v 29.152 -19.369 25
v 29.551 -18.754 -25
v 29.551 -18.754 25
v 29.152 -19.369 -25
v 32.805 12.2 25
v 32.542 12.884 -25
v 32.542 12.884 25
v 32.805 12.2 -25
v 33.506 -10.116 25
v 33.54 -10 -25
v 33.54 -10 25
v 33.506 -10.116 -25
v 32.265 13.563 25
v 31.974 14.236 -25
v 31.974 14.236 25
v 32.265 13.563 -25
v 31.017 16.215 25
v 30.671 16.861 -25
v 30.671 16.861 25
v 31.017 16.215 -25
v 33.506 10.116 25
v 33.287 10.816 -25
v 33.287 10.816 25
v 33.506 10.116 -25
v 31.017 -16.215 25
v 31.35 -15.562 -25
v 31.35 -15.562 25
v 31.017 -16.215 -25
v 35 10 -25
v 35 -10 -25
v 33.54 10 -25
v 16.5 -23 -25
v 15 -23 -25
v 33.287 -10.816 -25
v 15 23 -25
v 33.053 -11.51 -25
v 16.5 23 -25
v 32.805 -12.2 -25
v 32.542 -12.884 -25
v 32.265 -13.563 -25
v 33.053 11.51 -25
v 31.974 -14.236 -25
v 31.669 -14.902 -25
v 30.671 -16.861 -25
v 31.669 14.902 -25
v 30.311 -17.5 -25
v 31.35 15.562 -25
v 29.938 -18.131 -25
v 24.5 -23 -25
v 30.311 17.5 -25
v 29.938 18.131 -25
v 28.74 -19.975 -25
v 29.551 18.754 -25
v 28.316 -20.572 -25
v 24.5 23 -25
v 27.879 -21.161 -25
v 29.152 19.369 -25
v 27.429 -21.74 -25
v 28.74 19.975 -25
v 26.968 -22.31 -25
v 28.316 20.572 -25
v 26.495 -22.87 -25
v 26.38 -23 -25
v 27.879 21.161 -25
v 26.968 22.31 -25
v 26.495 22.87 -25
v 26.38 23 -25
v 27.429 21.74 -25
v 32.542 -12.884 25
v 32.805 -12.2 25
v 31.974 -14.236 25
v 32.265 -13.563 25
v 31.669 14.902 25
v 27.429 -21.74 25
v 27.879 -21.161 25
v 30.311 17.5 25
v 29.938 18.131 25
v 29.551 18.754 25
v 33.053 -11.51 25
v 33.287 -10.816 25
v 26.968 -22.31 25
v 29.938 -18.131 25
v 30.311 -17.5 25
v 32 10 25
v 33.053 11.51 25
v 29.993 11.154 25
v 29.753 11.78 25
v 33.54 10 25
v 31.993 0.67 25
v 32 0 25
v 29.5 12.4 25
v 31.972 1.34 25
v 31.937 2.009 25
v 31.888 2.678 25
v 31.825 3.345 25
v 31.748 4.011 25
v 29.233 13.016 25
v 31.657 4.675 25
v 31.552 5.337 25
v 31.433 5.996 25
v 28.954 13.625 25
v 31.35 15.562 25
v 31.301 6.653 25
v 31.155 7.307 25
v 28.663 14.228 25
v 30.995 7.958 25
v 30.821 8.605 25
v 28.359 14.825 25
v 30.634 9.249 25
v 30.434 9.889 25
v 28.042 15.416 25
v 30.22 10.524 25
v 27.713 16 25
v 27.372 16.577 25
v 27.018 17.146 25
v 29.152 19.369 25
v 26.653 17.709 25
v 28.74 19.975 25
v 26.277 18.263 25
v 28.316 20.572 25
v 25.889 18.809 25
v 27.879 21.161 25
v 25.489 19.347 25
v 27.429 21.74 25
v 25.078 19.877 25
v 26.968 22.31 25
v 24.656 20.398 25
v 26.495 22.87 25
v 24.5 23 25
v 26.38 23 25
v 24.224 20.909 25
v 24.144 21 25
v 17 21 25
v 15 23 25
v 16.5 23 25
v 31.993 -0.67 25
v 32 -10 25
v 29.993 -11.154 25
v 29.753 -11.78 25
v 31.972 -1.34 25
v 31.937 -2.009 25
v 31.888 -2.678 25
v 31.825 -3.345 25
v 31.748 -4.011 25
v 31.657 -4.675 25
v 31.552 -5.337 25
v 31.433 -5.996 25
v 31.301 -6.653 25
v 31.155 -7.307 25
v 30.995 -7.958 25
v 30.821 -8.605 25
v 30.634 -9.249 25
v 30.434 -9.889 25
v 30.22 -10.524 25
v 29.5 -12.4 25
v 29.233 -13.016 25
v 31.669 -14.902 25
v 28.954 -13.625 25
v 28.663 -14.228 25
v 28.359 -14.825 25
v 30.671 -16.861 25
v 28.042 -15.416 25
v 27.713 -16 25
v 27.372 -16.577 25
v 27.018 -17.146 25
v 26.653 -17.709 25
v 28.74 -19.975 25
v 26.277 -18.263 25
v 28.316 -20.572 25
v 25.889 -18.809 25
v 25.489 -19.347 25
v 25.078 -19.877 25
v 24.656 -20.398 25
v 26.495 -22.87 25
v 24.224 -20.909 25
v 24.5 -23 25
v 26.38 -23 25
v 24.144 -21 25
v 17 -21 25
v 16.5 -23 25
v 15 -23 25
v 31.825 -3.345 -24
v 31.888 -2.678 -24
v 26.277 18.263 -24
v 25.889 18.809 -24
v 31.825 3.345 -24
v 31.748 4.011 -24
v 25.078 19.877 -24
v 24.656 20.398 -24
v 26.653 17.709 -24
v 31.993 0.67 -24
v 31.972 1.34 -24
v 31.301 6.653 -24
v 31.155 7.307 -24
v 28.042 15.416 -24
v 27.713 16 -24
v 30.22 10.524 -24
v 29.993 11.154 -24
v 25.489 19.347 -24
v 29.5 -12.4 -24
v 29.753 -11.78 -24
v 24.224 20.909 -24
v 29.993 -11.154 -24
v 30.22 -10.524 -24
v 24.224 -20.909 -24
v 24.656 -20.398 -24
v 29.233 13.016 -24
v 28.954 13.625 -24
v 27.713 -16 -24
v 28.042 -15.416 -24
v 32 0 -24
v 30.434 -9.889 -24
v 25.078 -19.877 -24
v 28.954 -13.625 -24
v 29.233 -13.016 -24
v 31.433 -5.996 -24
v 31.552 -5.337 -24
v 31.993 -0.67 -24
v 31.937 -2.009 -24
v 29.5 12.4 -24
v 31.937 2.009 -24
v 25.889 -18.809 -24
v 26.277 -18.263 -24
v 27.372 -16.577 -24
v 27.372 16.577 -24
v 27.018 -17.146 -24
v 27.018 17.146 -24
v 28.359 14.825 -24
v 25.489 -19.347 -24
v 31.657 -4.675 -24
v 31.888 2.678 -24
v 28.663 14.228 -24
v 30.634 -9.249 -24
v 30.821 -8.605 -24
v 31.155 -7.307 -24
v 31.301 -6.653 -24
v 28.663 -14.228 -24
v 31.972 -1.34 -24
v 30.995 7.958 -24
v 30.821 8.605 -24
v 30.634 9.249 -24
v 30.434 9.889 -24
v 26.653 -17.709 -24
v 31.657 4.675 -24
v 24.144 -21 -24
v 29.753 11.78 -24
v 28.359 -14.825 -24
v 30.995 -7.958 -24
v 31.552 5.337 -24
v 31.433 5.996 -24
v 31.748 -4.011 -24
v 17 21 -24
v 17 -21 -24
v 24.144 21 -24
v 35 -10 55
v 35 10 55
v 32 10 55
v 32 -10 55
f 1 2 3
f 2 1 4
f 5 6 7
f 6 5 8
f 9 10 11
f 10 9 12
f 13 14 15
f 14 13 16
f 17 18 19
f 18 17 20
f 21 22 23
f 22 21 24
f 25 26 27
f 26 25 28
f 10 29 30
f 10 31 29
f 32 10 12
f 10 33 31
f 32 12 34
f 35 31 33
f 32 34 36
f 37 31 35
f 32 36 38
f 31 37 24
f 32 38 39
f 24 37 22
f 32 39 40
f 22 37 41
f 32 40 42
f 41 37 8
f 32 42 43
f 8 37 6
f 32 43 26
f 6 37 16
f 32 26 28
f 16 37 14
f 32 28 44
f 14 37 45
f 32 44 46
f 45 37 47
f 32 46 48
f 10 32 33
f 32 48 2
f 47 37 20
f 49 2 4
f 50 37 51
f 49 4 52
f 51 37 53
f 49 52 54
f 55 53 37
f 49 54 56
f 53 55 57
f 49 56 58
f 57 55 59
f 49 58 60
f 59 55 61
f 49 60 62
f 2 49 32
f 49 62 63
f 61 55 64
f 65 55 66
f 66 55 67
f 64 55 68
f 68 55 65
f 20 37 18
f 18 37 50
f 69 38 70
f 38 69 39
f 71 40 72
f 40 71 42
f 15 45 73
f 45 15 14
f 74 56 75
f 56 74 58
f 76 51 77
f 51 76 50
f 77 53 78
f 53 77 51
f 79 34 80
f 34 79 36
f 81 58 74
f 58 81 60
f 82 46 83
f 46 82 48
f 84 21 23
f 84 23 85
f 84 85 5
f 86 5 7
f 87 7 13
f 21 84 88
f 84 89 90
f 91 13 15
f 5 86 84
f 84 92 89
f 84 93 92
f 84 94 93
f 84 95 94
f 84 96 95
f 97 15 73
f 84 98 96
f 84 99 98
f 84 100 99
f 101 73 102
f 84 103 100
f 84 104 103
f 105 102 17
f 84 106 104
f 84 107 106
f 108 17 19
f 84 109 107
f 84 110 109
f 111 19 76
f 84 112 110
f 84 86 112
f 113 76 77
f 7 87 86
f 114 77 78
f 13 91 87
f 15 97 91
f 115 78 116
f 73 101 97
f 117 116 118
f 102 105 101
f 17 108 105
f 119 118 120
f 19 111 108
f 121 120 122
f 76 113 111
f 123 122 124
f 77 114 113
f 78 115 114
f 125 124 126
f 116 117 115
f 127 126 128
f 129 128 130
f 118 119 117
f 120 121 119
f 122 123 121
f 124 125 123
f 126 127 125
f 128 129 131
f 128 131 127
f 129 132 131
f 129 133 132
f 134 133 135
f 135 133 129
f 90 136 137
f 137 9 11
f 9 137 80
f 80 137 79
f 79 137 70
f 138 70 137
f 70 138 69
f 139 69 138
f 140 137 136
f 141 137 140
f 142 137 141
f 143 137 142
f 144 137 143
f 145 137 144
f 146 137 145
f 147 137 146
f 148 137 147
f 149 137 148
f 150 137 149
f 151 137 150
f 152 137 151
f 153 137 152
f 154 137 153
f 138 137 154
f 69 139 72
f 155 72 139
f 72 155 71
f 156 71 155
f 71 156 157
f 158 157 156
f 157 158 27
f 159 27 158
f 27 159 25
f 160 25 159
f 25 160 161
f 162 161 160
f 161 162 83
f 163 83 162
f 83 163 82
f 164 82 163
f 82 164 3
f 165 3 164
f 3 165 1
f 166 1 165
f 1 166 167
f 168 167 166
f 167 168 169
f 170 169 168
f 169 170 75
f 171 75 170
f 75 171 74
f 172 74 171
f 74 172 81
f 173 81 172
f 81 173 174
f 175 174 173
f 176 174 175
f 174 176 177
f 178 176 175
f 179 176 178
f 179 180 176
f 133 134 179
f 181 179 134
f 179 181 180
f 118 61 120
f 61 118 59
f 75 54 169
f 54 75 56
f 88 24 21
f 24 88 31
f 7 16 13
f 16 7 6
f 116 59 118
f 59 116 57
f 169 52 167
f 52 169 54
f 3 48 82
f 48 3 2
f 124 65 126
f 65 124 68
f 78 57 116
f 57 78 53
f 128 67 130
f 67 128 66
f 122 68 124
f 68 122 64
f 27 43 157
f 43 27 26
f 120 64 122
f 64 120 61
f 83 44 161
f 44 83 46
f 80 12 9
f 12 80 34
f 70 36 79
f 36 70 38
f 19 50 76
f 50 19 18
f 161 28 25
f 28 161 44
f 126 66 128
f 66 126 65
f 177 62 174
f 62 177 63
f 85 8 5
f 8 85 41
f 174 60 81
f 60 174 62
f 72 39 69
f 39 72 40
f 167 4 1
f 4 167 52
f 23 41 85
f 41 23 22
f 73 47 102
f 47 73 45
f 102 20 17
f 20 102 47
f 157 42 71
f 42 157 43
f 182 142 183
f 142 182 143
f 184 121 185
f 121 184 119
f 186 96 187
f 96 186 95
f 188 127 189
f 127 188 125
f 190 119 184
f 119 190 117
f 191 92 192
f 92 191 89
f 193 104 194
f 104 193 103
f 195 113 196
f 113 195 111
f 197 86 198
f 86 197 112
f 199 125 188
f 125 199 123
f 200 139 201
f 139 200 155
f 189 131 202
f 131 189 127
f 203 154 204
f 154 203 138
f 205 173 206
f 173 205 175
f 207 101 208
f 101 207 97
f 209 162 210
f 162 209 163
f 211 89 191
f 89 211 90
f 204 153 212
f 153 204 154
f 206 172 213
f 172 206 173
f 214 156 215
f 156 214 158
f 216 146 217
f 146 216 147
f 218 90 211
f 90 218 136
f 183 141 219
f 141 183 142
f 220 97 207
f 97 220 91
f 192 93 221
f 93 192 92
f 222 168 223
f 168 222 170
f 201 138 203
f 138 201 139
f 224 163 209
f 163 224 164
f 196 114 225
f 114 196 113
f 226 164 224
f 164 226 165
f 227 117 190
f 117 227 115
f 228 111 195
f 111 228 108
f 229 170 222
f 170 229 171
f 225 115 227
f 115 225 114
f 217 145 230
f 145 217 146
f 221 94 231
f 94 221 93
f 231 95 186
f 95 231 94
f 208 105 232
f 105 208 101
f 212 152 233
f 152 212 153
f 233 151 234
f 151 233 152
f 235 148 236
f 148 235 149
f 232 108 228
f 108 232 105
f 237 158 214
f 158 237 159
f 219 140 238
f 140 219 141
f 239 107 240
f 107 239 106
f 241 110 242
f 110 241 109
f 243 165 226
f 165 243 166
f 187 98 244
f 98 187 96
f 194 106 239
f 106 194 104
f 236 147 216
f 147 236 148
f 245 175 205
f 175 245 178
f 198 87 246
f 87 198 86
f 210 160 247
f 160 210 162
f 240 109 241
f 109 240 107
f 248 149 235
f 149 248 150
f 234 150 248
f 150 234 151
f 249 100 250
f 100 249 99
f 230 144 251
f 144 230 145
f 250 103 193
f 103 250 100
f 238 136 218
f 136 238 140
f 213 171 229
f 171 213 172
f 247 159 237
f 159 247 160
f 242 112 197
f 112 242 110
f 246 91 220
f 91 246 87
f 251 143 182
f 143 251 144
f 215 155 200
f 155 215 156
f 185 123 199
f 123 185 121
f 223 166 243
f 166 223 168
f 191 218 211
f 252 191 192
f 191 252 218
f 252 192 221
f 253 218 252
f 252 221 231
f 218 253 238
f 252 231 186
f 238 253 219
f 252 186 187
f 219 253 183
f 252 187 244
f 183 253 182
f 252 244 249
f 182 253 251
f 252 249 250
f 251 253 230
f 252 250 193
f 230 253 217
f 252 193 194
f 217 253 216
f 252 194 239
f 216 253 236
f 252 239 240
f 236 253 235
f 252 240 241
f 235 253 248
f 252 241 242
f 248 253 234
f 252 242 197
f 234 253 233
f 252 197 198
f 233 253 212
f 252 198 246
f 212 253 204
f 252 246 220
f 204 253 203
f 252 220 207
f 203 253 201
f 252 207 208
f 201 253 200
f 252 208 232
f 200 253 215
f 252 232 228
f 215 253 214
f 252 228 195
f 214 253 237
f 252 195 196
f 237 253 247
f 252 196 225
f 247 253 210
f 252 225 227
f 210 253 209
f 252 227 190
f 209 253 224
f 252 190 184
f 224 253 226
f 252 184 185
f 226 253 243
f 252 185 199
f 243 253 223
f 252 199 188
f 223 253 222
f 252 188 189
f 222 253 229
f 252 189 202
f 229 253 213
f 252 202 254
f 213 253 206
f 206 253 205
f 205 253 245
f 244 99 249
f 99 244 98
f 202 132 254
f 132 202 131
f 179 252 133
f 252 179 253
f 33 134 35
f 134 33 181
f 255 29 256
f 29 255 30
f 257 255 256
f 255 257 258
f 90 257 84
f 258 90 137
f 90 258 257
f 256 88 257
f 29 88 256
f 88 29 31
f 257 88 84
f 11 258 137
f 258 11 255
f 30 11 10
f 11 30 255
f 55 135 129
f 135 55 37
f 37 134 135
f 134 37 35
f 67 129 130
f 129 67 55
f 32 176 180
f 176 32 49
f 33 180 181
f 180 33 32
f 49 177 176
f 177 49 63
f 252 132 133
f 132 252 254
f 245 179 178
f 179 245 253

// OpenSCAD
///////////////////////////////////////////////////////////////////////////
// 
// 3D CAD Remote control holder
// 
// Description:
// CAD basic design for a light remote control holder to be screwed on the 
// wall. The remote is of a very standard shape that comes with these
// lightings https://www.amazon.ca/dp/B0BRQ4Q69M 
//
// Language: OpenSCAD (https://openscad.org/)
//
// Author: Carol Gauthier
//         https://github.com/carolg
//         https://www.linkedin.com/in/carolgauthier/
//
// License: Creative Common CC0 
//          https://creativecommons.org/public-domain/cc0/
// 
///////////////////////////////////////////////////////////////////////////

difference(){
    union(){
        
        difference(){
            difference(){
                cylinder(h=50,r=35,center=true,$fn=300);
                translate([0,0,2]) cylinder(h=52,r=32,center=true,$fn=300);
            }
            translate([-18,0,0]) cube([70,70,120],true);
            
        }
    
        translate([16,0,0]) cube([2,60,50],true);
        translate([33.5,0,15]) cube([3,20,80],true);
    }
    union(){
        translate([0,23,-35]) cube([50,50,80]);
        translate([0,-73,-35]) cube([50,50,80]);
    }
}
translate([20.5,22,0]) cube([8,2,50],true);
translate([20.5,-22,0]) cube([8,2,50],true);
